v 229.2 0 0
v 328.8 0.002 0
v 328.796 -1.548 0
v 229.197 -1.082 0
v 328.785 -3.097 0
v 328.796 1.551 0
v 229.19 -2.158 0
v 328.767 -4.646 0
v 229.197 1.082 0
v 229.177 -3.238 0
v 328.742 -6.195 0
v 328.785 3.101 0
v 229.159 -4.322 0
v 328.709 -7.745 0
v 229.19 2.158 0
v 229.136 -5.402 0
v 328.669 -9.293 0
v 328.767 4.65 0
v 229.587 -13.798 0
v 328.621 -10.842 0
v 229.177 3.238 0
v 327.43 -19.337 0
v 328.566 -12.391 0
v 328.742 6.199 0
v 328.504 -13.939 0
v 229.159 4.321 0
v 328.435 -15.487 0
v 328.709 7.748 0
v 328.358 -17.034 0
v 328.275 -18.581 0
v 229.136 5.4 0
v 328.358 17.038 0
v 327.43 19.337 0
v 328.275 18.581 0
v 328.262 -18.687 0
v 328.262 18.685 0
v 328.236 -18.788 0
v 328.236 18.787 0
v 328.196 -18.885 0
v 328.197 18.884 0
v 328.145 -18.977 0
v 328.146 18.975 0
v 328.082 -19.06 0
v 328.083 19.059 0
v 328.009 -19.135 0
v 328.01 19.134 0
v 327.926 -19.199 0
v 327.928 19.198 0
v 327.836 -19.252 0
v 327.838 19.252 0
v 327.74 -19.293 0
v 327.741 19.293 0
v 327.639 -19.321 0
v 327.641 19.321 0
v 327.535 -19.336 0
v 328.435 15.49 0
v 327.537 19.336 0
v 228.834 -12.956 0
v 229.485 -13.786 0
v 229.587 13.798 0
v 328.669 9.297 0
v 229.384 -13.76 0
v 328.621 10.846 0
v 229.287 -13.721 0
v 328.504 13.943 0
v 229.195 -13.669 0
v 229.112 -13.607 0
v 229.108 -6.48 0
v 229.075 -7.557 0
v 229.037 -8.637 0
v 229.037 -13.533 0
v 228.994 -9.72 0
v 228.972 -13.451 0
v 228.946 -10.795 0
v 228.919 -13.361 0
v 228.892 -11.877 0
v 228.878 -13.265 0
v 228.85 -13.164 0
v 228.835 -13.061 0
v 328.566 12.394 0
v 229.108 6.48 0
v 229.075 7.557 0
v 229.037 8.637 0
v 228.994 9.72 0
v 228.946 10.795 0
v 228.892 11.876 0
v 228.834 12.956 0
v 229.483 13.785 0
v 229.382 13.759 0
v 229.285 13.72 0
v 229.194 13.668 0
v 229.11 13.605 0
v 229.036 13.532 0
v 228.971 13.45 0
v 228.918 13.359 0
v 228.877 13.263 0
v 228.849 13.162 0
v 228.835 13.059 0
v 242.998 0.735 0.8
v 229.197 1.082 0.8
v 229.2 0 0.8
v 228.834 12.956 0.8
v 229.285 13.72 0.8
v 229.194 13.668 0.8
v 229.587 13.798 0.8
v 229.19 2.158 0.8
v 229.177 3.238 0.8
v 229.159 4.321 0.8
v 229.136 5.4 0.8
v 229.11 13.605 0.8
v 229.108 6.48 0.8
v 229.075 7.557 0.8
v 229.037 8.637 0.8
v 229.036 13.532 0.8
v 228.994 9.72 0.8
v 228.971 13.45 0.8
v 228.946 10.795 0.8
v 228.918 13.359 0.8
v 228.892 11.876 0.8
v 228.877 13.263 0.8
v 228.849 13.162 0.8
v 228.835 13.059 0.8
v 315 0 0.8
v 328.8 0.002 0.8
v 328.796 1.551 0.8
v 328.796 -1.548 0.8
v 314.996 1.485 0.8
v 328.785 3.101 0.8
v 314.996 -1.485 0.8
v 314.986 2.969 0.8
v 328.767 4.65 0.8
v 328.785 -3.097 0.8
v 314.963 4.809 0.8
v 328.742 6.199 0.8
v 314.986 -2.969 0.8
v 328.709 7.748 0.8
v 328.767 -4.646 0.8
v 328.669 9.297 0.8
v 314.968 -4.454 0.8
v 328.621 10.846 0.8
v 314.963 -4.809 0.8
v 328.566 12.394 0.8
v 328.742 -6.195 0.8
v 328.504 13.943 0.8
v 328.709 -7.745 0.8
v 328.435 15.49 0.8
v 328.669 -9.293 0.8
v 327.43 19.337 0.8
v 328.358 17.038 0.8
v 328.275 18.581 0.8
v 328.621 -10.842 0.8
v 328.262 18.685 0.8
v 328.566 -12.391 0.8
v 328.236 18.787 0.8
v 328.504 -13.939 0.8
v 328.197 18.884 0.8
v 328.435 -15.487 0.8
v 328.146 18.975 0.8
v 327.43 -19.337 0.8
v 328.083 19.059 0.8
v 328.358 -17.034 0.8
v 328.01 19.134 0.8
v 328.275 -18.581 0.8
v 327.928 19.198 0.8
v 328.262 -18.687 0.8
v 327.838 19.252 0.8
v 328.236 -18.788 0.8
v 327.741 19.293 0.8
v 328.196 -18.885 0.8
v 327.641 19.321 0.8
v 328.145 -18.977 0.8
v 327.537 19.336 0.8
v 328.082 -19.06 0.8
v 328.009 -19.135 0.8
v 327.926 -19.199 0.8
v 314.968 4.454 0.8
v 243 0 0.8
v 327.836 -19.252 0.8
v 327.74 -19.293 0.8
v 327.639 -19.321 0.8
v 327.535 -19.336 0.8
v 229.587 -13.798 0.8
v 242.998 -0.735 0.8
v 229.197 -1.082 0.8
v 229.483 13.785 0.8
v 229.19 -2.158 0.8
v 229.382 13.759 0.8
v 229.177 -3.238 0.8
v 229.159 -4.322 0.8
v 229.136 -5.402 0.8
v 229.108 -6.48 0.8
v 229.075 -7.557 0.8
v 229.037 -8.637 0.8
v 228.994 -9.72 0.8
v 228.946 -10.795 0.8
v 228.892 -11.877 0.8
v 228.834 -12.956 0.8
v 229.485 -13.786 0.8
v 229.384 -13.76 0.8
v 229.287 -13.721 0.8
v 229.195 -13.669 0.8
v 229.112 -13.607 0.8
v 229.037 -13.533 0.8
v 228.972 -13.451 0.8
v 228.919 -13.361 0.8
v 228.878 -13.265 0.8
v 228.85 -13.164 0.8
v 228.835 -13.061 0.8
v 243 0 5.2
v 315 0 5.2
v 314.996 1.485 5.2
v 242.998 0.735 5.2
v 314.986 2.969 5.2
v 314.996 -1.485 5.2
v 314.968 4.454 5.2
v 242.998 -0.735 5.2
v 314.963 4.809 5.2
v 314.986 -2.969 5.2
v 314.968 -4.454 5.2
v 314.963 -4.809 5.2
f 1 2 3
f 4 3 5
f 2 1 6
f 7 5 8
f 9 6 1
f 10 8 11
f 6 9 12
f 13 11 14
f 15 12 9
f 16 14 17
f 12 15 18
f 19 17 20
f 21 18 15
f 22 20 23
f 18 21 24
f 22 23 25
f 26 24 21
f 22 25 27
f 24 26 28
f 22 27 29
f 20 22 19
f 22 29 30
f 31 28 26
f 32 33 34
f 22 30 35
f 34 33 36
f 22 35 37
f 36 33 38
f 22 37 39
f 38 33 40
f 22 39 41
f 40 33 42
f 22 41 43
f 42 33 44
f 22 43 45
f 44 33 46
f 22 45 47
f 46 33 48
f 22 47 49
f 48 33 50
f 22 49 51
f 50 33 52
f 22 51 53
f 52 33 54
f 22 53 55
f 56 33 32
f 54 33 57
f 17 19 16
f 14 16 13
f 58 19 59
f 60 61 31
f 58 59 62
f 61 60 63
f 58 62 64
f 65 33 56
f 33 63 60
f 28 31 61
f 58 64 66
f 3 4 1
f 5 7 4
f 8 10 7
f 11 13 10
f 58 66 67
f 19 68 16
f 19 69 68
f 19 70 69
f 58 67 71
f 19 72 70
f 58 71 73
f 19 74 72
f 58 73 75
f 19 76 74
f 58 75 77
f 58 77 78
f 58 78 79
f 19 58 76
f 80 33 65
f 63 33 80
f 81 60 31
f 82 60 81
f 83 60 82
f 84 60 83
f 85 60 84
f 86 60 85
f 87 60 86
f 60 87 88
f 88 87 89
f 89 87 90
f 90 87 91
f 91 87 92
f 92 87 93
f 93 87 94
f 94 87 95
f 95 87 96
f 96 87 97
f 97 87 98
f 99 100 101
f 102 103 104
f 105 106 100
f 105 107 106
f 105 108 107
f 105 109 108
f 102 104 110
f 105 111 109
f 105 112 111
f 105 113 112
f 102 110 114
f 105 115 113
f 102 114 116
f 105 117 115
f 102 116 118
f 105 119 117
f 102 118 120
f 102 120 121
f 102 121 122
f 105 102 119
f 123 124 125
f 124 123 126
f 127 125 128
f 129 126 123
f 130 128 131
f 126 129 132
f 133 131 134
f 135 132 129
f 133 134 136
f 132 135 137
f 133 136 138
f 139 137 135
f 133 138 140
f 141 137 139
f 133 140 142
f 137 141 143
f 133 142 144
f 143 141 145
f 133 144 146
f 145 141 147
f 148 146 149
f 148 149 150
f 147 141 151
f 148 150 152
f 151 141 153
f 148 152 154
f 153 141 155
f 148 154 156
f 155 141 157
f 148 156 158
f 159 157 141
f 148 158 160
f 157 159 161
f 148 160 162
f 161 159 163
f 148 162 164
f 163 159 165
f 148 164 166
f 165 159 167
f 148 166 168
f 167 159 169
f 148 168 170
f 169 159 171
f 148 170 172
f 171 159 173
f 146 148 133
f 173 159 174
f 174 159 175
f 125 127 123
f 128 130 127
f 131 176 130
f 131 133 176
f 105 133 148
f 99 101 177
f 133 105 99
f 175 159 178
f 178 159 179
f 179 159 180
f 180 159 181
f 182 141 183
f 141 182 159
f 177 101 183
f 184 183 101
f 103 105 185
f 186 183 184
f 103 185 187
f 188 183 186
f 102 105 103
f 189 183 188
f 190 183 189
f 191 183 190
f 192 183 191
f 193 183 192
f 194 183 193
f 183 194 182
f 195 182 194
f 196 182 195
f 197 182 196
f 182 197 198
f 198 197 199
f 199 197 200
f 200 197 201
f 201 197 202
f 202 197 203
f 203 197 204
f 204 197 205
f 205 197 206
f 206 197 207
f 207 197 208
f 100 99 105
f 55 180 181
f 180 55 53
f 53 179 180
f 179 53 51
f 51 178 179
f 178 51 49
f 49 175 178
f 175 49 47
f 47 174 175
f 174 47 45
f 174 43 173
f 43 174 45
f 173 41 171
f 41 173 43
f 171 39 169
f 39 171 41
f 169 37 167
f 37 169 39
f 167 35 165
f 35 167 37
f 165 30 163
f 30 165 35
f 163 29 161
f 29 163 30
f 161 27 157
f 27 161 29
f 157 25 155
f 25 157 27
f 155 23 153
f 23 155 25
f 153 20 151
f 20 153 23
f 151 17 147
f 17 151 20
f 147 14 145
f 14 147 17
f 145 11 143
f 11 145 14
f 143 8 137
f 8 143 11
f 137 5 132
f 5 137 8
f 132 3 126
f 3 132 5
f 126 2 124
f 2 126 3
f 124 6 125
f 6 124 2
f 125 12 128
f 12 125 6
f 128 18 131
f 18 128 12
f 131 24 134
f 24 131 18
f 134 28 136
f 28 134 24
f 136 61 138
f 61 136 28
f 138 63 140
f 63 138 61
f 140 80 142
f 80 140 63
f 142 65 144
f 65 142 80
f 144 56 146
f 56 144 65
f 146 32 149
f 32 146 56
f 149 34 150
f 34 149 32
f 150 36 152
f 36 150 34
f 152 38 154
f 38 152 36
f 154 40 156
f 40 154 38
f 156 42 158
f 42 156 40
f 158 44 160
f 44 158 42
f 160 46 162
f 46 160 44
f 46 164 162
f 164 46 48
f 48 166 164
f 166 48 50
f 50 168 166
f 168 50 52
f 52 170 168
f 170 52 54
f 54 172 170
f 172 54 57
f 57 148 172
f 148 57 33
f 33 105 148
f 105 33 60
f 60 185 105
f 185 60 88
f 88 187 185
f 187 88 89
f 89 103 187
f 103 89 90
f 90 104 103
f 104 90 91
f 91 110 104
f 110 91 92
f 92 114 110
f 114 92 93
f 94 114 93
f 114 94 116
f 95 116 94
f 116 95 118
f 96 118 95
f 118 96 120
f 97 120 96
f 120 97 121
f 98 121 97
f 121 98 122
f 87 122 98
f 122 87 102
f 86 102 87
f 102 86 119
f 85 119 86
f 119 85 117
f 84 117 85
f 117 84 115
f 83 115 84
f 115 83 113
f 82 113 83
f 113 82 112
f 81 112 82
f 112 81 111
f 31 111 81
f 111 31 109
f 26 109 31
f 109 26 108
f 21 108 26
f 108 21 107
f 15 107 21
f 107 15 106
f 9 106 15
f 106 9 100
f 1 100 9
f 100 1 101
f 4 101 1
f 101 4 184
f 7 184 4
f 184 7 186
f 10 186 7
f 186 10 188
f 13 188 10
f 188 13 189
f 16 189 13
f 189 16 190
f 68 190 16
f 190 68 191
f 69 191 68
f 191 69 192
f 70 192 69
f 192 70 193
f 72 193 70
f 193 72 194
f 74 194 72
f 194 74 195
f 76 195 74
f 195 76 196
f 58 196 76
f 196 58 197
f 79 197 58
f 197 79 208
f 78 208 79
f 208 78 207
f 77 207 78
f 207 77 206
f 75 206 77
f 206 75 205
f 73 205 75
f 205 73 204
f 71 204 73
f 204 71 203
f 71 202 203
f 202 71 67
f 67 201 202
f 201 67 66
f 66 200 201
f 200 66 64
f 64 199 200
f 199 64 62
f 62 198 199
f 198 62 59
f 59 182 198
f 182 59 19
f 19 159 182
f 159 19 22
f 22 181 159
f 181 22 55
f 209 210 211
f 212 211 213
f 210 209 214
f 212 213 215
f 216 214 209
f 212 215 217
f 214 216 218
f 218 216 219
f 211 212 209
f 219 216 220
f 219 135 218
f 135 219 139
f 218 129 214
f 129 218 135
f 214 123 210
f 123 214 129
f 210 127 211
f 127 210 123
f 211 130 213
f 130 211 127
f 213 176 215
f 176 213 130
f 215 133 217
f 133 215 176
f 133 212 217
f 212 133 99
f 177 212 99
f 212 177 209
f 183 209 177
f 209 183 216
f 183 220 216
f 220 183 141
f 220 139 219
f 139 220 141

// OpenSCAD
// Gen-DZ — bobbin BASE (bottom flange + hub). Print x12, flange down. Wind 24 AWG x 156 t around
// the hub with the LID glued on (coil_lid.stl). Copper lives ONLY between the flanges (no proud winds).
include <parameters.scad>;
$fn = 48;
module sector_2d(r_in, r_out, ang) {
    polygon([
        for (a = [-ang/2 : ang/24 : ang/2]) [r_in*cos(a), r_in*sin(a)],
        for (a = [ang/2 : -ang/24 : -ang/2]) [r_out*cos(a), r_out*sin(a)]
    ]);
}
module footprint_2d() { offset(r=wall) sector_2d(coil_id_r, coil_od_r, span_deg); }
module hub_2d()       { offset(delta=-coil_core_inset) sector_2d(coil_id_r, coil_od_r, span_deg); }

union() {
    linear_extrude(flange_t) footprint_2d();
    translate([0, 0, flange_t - 0.01]) linear_extrude(former_web + 0.01) hub_2d();
}
